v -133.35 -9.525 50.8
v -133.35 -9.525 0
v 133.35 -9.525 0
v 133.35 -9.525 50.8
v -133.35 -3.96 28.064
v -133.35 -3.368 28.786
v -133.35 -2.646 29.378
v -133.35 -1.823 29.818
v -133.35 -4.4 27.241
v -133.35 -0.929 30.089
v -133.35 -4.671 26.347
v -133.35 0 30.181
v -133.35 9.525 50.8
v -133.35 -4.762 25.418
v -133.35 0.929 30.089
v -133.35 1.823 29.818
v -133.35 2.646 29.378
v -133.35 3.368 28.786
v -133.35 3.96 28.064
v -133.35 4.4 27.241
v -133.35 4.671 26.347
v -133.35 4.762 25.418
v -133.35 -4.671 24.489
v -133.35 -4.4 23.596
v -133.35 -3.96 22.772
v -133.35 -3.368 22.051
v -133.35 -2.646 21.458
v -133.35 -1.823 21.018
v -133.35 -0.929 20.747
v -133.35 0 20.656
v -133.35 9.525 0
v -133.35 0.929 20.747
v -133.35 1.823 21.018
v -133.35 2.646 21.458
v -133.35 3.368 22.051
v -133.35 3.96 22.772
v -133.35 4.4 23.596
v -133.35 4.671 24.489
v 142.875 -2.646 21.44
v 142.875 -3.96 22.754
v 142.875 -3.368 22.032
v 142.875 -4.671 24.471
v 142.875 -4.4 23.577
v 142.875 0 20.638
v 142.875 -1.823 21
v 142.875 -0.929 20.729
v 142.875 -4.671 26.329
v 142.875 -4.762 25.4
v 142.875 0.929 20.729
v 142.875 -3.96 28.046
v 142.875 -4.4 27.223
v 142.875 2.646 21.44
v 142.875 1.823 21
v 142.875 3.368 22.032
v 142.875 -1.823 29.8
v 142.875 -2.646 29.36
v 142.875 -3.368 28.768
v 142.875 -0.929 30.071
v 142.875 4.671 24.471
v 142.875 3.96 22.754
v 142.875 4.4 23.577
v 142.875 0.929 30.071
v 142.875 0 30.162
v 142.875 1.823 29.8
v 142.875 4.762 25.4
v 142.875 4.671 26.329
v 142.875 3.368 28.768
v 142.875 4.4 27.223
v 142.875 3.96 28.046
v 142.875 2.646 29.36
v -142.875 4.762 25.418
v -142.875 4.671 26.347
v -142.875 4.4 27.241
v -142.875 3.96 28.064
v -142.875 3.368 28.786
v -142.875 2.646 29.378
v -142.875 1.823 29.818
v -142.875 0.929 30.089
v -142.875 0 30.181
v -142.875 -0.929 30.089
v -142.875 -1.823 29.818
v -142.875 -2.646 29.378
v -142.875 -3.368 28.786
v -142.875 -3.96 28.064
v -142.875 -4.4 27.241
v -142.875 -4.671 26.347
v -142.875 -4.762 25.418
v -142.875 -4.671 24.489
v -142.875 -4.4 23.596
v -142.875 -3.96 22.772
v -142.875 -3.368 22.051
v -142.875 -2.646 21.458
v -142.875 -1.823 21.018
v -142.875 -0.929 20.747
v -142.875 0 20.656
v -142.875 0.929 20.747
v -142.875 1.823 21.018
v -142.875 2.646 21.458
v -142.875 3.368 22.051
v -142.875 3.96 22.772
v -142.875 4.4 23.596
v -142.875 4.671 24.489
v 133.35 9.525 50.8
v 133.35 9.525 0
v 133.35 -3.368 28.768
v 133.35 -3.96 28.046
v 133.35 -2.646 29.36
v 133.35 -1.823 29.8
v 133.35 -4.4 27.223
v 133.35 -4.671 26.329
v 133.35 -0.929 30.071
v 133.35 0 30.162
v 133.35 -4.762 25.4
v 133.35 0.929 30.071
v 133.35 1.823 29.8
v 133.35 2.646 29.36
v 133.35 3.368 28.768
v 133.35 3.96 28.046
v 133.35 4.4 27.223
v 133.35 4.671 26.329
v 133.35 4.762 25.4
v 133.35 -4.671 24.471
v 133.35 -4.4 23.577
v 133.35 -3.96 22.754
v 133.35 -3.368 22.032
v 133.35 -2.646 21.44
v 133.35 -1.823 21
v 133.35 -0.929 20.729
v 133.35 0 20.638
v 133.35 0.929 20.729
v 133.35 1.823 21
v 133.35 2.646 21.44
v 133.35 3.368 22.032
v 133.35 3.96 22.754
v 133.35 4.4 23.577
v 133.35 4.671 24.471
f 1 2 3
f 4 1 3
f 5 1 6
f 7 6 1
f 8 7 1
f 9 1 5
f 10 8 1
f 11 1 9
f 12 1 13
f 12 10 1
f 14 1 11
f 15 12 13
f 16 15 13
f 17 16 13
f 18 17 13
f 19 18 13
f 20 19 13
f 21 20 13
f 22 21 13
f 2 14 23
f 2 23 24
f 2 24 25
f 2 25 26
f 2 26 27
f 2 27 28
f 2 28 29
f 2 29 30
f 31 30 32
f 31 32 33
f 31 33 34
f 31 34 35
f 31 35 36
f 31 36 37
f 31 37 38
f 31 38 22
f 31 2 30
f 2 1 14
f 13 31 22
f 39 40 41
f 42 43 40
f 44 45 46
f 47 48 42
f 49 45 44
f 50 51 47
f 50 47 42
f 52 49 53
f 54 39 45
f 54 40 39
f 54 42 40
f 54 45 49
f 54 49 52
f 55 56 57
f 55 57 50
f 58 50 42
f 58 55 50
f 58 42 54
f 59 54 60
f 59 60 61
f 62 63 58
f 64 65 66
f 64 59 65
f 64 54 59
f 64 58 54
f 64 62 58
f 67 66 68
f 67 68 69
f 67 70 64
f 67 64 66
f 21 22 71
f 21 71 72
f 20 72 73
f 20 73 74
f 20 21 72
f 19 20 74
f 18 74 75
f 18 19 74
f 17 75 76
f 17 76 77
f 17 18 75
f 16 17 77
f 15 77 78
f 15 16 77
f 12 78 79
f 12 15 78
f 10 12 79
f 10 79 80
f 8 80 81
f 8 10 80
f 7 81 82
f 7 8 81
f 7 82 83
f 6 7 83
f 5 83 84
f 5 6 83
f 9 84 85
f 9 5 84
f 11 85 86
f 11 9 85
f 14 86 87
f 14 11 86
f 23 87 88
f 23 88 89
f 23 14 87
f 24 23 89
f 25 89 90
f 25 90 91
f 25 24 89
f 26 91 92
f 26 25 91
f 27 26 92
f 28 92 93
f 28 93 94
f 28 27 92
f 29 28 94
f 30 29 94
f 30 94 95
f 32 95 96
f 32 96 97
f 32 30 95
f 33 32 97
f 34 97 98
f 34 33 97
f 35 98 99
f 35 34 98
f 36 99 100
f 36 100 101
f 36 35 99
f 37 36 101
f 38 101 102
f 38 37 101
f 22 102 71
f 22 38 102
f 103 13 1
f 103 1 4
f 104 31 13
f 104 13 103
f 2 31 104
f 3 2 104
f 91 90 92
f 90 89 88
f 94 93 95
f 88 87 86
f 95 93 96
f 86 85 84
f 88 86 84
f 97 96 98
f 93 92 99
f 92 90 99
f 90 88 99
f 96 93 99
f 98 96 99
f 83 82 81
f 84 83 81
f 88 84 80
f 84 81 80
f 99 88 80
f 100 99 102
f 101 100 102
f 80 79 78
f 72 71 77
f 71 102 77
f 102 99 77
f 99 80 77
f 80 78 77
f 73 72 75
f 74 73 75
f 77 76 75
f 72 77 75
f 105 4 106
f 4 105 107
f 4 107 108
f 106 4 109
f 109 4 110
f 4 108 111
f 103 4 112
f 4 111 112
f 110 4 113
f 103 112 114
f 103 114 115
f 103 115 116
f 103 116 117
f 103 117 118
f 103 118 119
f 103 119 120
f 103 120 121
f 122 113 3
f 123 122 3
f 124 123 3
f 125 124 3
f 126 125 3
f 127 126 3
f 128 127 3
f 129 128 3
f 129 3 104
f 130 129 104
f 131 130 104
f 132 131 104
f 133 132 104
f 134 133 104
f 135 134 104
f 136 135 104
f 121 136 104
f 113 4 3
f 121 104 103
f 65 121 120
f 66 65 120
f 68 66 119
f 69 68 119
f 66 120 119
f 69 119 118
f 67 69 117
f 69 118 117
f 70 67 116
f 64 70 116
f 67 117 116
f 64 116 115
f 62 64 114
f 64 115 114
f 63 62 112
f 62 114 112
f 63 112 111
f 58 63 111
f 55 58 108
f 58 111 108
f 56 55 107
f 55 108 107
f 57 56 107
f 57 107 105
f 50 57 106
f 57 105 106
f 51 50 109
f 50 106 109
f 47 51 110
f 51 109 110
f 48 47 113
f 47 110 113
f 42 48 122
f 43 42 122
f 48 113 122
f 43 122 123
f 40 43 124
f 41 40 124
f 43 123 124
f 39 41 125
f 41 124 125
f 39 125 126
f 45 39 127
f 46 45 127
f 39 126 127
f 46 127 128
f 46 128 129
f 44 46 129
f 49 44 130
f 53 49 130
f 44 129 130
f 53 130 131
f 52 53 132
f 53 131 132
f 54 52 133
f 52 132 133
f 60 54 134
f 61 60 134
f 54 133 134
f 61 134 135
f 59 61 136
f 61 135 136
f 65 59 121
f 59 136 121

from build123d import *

# Parameters (mm, degrees)
F0_W     = 266.7
F0_H     = 19.05
F1_DEPTH = 50.8
F3_R     = 4.7625
F4_DEPTH = 9.525
F6_R     = 4.7625
F7_DEPTH = 9.525


with BuildPart() as f1:
    # F0 (on Top) → F1 (new body)
    with BuildSketch(Plane.XY):
        Rectangle(F0_W, F0_H)
    extrude(amount=F1_DEPTH)

    # F3 (on offset) → F4 (join)
    with BuildSketch(Plane.YZ.offset(133.35)):
        with Locations((0, 25.4)):
            Circle(F3_R)
    extrude(amount=F4_DEPTH)

    # F6 (on offset) → F7 (join)
    with BuildSketch(Plane.YZ.offset(-133.35)):
        with Locations((0, 25.418339)):
            Circle(F6_R)
    extrude(amount=-F7_DEPTH)


solid = f1.part
